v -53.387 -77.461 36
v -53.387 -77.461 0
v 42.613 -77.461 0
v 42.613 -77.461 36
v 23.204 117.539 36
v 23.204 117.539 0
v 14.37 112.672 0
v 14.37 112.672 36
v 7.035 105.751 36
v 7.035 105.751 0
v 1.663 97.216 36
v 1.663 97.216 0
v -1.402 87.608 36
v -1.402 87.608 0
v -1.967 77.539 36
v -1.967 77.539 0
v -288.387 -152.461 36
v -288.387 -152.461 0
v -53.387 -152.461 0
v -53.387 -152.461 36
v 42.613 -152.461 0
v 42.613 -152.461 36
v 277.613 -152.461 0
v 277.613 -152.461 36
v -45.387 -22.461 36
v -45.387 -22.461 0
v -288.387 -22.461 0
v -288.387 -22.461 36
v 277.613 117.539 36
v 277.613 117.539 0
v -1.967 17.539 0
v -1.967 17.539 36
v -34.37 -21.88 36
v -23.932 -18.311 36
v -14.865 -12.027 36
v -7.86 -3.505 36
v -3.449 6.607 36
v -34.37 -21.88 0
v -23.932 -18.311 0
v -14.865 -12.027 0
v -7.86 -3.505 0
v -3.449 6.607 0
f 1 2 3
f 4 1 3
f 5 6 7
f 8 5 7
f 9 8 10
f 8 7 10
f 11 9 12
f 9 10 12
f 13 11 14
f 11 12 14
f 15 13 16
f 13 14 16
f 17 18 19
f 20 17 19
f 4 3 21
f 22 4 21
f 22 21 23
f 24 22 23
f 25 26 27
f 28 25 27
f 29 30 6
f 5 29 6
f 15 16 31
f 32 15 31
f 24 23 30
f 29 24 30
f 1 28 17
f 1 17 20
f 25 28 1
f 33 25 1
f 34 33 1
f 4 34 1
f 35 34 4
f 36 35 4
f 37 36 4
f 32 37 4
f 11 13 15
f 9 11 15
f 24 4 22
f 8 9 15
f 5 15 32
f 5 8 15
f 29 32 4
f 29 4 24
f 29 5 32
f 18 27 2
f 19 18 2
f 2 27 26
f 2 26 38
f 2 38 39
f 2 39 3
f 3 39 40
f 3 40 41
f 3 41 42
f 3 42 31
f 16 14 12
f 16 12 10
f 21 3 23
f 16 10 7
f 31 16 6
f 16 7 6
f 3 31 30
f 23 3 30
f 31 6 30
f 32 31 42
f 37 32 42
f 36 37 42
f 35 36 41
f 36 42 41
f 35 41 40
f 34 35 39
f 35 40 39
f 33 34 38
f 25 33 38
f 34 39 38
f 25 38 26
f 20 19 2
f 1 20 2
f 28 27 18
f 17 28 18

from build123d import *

# Parameters (mm, degrees)
F1_DEPTH = 36


with BuildPart() as f1:
    # F0 (on Top) → F1 (new body)
    with BuildSketch(Plane.XY):
        with BuildLine():
            Line((-288.386514, -22.46141), (-288.386514, -152.46141))
            Line((-288.386514, -152.46141), (-53.386514, -152.46141))
            Line((-53.386514, -152.46141), (-53.386514, -77.46141))
            Line((-53.386514, -77.46141), (42.613486, -77.46141))
            Line((42.613486, -77.46141), (42.613486, -152.46141))
            Line((42.613486, -152.46141), (277.613486, -152.46141))
            Line((277.613486, -152.46141), (277.613486, 117.53859))
            Line((277.613486, 117.53859), (23.203639, 117.53859))
            ThreePointArc((23.203639, 117.53859), (4.079002, 101.6535), (-1.967393, 77.53859))
            Line((-1.967393, 77.53859), (-1.967393, 17.53859))
            ThreePointArc((-1.967393, 17.53859), (-14.864905, -12.026696), (-45.386514, -22.46141))
            Line((-45.386514, -22.46141), (-288.386514, -22.46141))
        make_face()
    extrude(amount=F1_DEPTH)


solid = f1.part
